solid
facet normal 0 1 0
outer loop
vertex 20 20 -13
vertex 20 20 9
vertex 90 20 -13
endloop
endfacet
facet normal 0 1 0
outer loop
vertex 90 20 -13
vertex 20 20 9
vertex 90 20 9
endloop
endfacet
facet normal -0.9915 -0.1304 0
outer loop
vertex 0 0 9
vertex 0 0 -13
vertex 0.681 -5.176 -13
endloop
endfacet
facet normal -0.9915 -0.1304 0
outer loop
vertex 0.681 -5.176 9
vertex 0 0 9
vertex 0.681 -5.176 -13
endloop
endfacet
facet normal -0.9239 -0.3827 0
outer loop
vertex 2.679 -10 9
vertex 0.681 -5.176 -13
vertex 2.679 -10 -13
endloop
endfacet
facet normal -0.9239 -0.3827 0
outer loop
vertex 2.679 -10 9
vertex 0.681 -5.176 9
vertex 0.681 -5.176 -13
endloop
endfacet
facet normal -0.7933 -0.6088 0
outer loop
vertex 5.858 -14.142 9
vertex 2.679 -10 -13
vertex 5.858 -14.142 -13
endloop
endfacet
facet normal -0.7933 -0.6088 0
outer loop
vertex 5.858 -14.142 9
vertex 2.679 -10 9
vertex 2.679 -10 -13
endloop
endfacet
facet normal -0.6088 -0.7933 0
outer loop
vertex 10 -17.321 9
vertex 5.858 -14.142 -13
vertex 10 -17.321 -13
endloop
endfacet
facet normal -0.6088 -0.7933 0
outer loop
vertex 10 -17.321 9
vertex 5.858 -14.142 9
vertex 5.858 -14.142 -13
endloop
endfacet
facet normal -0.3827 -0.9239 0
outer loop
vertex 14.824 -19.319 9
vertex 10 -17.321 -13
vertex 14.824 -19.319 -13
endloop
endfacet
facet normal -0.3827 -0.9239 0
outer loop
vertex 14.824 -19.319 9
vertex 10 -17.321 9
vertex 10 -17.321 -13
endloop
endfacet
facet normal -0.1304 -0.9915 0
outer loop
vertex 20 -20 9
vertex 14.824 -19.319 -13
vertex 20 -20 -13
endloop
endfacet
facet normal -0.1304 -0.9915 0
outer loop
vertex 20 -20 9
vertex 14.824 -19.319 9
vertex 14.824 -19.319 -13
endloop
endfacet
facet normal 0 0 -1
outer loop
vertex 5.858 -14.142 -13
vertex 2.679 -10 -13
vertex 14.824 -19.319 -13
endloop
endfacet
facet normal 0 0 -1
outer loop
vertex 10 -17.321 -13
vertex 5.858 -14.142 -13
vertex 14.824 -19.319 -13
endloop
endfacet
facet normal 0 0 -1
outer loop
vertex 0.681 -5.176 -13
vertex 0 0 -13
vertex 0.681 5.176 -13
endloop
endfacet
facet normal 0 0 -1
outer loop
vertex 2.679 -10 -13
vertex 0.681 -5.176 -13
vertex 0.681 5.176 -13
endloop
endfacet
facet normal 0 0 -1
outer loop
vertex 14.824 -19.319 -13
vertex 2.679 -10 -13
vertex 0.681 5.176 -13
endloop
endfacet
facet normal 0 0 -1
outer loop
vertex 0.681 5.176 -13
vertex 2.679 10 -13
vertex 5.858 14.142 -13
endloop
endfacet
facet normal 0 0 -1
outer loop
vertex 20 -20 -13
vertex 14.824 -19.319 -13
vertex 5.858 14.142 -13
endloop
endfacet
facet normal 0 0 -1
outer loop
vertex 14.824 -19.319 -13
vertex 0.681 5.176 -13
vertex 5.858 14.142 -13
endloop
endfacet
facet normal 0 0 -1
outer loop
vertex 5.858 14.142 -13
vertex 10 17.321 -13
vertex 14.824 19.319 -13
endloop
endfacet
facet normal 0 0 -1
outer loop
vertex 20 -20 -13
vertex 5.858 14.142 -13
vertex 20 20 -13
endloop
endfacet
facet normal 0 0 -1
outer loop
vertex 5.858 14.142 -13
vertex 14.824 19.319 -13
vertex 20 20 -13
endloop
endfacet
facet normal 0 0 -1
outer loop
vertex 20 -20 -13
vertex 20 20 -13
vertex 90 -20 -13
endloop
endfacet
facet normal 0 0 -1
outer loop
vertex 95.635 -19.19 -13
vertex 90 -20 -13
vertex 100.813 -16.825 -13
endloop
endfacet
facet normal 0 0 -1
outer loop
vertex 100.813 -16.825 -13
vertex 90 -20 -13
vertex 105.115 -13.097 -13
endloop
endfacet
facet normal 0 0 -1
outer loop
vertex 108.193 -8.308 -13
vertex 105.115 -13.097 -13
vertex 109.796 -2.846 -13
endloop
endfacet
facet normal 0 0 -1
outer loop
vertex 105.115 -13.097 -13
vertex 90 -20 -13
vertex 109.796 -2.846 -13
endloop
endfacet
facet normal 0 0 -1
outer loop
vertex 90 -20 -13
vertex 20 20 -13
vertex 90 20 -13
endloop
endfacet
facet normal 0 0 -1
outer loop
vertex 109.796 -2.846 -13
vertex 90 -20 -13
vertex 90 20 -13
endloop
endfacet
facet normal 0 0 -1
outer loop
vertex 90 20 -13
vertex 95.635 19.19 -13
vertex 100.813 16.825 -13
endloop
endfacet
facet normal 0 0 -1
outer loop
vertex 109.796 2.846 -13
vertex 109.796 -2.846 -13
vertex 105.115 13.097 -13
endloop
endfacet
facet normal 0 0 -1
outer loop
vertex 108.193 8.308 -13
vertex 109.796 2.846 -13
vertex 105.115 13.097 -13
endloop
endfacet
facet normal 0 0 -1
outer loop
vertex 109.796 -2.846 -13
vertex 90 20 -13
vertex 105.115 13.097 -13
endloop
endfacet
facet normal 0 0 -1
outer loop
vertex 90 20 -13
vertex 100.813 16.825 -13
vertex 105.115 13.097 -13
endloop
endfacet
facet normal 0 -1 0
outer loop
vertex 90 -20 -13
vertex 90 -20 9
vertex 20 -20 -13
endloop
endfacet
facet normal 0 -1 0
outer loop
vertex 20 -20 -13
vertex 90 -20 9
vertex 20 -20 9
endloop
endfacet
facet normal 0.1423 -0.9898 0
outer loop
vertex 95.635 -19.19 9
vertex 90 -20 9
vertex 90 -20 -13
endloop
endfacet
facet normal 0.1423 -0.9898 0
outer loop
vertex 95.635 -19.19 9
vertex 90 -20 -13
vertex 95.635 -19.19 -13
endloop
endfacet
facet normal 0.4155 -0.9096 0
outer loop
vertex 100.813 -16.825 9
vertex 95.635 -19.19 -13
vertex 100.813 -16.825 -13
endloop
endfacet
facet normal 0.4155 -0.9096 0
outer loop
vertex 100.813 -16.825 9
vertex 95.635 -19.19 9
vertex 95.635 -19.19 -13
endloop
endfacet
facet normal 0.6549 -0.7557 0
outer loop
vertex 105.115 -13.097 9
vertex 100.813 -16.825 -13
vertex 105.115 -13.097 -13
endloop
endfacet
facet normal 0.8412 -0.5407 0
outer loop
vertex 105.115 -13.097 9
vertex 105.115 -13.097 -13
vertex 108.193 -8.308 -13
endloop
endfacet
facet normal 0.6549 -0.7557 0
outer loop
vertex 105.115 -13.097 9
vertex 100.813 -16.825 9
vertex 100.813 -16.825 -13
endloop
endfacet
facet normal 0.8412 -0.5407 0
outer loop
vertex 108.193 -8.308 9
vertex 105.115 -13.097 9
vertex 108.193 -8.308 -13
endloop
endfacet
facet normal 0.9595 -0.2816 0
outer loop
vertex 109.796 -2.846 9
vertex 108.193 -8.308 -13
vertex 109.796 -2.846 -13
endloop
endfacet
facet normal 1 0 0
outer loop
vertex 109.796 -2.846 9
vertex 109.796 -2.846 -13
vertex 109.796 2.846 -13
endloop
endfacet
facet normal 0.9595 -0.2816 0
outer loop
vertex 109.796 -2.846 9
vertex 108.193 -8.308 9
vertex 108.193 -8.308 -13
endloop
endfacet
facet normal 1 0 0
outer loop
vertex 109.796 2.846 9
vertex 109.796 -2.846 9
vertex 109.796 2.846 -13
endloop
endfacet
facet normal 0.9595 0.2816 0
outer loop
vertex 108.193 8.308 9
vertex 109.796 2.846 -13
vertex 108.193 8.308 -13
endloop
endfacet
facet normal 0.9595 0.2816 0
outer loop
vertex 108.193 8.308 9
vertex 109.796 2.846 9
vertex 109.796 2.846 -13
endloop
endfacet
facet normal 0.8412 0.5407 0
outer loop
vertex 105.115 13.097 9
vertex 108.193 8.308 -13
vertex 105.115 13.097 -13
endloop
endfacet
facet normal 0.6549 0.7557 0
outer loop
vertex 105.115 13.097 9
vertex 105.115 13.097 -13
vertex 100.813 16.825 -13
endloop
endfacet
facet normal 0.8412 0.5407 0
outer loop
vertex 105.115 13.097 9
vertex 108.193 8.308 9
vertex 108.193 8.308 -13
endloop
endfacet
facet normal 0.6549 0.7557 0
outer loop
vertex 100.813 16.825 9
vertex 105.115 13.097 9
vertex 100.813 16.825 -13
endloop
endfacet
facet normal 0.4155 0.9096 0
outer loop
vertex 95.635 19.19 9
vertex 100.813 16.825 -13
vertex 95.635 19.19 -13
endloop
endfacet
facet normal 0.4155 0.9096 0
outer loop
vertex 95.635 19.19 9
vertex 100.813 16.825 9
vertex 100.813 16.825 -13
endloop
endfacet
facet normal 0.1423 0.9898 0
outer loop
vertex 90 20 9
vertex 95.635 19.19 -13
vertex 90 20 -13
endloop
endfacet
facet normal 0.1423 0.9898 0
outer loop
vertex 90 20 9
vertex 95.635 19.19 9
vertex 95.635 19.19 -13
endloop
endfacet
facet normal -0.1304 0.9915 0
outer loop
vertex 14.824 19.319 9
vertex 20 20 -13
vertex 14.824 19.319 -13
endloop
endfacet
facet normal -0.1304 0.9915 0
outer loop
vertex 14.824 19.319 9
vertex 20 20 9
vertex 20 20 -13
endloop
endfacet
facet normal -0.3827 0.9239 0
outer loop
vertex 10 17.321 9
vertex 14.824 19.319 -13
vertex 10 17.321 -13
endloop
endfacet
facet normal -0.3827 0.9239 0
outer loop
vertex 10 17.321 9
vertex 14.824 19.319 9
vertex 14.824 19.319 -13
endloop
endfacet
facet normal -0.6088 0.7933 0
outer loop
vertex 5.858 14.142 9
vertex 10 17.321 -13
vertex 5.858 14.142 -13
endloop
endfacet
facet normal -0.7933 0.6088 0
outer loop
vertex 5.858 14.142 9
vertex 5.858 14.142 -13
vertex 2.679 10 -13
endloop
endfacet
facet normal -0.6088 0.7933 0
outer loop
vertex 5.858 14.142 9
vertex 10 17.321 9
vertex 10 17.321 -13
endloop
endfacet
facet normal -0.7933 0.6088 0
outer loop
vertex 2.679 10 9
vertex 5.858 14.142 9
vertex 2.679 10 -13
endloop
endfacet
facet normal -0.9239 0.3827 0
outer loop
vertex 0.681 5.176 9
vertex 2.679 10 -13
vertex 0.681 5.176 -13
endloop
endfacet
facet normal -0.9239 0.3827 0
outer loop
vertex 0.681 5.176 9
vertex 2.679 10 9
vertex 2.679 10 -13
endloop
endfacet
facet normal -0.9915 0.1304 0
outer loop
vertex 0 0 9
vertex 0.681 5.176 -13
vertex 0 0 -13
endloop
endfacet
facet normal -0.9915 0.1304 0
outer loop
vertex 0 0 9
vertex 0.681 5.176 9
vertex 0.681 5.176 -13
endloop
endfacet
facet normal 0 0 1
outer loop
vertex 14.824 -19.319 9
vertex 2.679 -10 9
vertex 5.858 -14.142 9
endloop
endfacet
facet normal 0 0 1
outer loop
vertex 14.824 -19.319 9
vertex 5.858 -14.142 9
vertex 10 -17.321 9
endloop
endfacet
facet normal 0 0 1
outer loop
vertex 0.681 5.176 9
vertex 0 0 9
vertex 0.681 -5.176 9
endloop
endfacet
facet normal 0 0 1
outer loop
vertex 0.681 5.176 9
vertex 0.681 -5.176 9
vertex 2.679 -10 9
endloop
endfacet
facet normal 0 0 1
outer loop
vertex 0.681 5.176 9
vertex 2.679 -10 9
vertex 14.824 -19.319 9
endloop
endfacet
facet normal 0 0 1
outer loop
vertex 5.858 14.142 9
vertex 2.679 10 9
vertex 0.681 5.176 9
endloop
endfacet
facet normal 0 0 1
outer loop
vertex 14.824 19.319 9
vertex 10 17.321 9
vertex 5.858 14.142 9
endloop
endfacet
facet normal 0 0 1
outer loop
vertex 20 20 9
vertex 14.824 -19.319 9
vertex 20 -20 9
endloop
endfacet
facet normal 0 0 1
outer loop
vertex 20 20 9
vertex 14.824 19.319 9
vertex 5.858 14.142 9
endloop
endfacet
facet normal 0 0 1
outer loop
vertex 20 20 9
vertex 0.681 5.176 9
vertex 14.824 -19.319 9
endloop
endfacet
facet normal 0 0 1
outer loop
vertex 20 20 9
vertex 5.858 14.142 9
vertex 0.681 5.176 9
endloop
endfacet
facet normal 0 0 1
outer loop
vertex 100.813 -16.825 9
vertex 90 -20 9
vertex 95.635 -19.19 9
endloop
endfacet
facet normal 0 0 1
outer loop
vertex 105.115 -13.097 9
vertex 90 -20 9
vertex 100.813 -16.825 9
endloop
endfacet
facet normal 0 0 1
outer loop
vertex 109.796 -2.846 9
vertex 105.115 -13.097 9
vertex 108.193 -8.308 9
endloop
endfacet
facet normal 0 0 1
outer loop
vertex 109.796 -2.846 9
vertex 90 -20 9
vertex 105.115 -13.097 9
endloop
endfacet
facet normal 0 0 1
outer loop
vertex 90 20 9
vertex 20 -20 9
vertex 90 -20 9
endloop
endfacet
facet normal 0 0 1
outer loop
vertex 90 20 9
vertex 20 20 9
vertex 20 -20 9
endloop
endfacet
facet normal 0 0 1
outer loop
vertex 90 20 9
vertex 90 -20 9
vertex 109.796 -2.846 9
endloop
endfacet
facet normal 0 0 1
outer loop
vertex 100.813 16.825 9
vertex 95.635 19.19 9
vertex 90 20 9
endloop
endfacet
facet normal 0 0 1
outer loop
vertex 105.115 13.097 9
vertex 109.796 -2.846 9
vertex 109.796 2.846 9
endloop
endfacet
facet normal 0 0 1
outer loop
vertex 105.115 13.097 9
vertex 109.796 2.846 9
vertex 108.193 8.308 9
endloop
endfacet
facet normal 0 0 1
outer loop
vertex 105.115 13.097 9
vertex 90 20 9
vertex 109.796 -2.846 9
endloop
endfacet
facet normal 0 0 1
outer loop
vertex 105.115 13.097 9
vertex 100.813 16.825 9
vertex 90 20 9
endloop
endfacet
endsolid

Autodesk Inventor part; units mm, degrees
sketch "Szkic1" plane through (0, 0, 0) normal (0, 0, 1) x (1, 0, 0)
  line L0 (20, 20) -> (90, 20)
  line L1 (90, -20) -> (20, -20)
  arc A0 (20, 20) -> (20, -20) centre (20, 0) ccw
  line L2 (0, 9.4) -> (0, -7.4) projected
  line L3 (-5, 0) -> (30, 0) projected
  arc A1 (90, -20) -> (90, 20) centre (90, 0) ccw
  line L4 (110, 0) -> (110, 7) construction
  dimension "d0" = 20
  dimension "d8" = 20
  dimension "d9" = 110
ref_plane "Work Plane1" through (0, 0, -13) normal (0, 0, 1) x (1, 0, 0)
ref_plane "Work Plane2" through (0, 0, 9) normal (0, 0, 1) x (1, 0, 0)
extrude "Bryła1" add sketch "Szkic1" against normal up to surface (22 mm away) from surface at 9
ref_plane "Work Plane3" through (110, 0, 9) normal (1, 0, 0) x (0, 1, 0)
equation "\"d0\" = 0.5 * PB"
equation "\"d8\" = 0.5 * PB"
equation "\"d9\" = NLG"
equation "\"d1\" = -PNT"
equation "\"d2\" = PH - PNT"
equation "\"NLG\" = 110"
equation "\"PNT\" = 13"
equation "\"PH\" = 22"
equation "\"RR\" = 0.001"
equation "\"PHH\" = 0"
equation "\"PUEB\" = 9.4"
equation "\"PB\" = 40"
properties part number "DIN 6885 - A 40 x 22 x 110" material "Stal, miękka"
